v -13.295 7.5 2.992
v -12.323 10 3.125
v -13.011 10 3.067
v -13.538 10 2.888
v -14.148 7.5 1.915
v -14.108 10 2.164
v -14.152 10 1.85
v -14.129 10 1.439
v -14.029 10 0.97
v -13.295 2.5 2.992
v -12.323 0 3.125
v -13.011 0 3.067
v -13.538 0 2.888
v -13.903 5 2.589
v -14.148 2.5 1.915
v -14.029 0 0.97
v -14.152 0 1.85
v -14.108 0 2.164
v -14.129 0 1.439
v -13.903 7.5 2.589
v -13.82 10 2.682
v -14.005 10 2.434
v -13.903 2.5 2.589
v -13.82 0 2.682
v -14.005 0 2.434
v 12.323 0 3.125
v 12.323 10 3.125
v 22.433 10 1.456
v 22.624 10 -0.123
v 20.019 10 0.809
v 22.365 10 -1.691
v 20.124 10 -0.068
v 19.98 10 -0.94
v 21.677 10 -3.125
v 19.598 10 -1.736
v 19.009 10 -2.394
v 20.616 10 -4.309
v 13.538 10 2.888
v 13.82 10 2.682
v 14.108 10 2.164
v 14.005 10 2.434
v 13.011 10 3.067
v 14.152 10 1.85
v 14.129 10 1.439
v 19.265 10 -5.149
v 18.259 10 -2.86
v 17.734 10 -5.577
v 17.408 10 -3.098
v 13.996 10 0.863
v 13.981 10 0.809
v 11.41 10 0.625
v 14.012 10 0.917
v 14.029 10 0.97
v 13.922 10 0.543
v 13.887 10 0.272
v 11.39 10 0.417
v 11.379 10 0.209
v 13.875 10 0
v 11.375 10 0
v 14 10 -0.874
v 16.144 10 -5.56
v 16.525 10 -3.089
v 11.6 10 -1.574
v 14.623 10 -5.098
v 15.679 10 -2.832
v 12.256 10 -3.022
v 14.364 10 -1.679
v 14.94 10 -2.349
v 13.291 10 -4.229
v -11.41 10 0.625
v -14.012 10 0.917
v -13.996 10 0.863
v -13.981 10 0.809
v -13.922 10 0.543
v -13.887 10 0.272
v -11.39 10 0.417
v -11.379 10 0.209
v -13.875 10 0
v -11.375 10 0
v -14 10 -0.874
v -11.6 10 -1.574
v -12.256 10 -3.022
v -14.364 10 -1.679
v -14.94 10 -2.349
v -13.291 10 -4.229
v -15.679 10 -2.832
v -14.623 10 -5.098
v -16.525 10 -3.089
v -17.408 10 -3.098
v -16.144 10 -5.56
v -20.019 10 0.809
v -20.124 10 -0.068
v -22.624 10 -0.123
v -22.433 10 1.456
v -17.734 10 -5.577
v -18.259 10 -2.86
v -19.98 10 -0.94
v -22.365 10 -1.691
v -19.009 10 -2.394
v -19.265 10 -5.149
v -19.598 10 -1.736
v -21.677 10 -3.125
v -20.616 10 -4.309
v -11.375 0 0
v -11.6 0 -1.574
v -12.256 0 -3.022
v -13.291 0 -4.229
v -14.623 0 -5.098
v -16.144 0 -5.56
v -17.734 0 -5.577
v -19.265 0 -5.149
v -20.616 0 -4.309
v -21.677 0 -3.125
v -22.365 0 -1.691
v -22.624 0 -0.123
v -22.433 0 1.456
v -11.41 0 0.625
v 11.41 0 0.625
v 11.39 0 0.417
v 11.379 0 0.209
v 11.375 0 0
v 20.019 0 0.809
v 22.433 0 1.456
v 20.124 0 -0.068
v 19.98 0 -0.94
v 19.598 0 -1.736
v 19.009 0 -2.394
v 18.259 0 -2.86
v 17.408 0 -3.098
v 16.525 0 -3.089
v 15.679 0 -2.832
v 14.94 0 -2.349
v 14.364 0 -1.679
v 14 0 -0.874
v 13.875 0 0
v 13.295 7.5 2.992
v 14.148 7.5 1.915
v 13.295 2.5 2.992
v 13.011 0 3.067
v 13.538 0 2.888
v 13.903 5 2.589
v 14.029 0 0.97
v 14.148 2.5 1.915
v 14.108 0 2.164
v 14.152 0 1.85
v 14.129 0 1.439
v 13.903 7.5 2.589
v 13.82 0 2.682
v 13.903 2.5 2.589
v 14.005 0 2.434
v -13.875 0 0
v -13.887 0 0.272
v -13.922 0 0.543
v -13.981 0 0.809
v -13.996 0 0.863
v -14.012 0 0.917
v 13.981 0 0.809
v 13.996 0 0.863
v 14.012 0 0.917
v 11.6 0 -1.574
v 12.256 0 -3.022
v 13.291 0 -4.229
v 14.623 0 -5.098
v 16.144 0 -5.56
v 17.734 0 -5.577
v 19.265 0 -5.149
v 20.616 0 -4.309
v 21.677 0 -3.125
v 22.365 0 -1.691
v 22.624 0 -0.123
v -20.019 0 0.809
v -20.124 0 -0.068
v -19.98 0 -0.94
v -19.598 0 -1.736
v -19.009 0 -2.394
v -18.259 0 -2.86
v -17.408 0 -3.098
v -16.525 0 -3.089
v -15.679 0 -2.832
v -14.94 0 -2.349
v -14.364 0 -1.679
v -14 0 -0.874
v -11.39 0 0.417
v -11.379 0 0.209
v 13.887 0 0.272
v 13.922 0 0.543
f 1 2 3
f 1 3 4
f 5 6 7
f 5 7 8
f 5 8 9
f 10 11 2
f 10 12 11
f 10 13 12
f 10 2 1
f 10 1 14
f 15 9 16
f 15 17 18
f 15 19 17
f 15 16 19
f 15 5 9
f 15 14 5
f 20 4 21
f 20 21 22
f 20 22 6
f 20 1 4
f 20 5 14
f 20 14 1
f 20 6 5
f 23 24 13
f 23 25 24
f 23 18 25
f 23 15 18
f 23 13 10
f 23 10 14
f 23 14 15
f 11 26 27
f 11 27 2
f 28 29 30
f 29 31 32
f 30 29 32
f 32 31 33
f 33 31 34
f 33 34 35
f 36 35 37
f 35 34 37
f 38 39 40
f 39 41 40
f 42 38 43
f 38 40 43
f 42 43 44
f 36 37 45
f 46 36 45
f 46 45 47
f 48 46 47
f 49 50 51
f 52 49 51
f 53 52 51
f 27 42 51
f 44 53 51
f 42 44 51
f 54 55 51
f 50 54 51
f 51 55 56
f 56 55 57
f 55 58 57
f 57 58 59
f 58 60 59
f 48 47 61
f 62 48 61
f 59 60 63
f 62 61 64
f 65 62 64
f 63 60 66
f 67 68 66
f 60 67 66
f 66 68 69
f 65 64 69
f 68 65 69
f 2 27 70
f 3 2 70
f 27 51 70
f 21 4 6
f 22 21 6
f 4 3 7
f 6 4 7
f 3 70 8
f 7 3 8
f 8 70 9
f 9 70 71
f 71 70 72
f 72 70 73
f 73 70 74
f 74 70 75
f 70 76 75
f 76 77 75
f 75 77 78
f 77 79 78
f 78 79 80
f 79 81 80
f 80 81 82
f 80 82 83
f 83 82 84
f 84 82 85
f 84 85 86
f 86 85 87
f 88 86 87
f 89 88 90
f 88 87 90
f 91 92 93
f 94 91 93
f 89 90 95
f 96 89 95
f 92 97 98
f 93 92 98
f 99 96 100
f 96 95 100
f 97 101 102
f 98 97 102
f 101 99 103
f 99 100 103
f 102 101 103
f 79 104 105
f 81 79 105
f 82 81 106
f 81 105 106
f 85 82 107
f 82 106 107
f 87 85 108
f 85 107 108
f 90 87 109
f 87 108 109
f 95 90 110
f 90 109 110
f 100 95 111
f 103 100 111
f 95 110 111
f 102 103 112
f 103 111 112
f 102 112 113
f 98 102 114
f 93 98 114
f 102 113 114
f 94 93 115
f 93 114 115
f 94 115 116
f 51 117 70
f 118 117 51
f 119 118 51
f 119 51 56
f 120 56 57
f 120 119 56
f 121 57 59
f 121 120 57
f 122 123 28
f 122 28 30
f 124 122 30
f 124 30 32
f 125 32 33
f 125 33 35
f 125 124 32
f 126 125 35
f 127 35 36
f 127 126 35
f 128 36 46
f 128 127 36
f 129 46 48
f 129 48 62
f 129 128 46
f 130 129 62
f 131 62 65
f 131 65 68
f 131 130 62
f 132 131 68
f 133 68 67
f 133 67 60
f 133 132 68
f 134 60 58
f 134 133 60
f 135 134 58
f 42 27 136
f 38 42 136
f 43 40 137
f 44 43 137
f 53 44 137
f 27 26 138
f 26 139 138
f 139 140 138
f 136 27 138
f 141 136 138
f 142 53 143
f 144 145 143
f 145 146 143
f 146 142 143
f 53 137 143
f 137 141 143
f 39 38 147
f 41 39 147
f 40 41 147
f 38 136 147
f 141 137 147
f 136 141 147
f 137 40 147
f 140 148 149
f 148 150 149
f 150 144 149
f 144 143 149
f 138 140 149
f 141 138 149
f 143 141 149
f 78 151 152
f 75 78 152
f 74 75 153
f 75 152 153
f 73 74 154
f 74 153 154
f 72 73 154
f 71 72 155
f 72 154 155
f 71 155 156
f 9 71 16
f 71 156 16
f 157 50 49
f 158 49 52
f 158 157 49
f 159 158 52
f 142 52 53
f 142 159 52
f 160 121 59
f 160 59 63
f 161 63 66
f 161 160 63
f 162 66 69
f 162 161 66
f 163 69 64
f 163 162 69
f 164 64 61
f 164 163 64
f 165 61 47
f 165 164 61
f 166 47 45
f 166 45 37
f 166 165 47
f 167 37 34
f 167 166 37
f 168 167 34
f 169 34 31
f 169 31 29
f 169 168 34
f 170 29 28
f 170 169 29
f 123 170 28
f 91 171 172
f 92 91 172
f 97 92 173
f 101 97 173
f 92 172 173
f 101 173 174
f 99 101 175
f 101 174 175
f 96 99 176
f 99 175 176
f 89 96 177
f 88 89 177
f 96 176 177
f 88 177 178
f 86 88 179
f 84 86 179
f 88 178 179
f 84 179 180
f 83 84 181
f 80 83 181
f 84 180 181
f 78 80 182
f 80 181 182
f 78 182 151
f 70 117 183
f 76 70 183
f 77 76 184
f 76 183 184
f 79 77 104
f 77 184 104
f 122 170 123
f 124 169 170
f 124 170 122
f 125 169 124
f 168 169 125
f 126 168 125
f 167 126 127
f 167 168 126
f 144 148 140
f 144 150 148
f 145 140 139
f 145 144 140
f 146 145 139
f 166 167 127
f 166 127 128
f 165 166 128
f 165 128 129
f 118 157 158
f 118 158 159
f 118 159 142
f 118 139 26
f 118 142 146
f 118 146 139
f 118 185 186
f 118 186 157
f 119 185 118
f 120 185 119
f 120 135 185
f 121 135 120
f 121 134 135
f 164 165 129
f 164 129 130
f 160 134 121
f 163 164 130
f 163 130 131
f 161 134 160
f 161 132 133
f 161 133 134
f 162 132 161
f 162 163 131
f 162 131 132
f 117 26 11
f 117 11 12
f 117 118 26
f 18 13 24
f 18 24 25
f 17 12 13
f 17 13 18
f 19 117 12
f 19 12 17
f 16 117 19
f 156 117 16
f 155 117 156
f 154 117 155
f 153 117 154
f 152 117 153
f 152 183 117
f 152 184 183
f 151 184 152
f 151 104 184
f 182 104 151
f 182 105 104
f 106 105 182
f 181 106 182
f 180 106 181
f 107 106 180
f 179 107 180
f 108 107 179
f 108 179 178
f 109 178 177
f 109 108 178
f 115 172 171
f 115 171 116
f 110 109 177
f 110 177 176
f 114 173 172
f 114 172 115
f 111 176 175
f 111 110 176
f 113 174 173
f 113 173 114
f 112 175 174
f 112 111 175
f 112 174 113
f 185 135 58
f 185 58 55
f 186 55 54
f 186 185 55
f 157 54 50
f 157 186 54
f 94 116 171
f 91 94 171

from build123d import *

# Parameters (mm, degrees)
BOSS_EXTRUDE1_DEPTH = 10


with BuildPart() as part:
    # Sketch1 → Boss-Extrude1 (new body)
    with BuildSketch(Plane(origin=(0, 0, 0), x_dir=(1, 0, 0), z_dir=(0, 1, 0))):
        with BuildLine():
            Line((-22.433332773, -1.455857129), (-20.018518207, -0.808809516))
            ThreePointArc((-20.018518207, -0.808809516), (-16.915803188, 3.123865538), (-14.029431878, -0.970231948))
            add(Edge.make_bspline(
                [(-12.322928267, -3.125), (-14.629677343, -3.130705569), (-14.029431878, -0.970231948)],
                knots=[0, 0, 0, 0.964614565, 0.964614565, 0.964614565], degree=2))
            Line((-12.322928267, -3.125), (0, -3.125))
            Line((0, -3.125), (0, -0.625))
            Line((0, -0.625), (-11.409830056, -0.625))
            ThreePointArc((-11.409830056, -0.625), (-17.422765144, 5.609090357), (-22.433332773, -1.455857129))
        make_face()
    boss_extrude1 = extrude(amount=BOSS_EXTRUDE1_DEPTH)

    # Mirror1: Boss-Extrude1 across plane
    add(boss_extrude1.mirror(Plane(origin=(0, 0, 0), x_dir=(0, 0, 1), z_dir=(1, 0, 0))))


solid = part.part
